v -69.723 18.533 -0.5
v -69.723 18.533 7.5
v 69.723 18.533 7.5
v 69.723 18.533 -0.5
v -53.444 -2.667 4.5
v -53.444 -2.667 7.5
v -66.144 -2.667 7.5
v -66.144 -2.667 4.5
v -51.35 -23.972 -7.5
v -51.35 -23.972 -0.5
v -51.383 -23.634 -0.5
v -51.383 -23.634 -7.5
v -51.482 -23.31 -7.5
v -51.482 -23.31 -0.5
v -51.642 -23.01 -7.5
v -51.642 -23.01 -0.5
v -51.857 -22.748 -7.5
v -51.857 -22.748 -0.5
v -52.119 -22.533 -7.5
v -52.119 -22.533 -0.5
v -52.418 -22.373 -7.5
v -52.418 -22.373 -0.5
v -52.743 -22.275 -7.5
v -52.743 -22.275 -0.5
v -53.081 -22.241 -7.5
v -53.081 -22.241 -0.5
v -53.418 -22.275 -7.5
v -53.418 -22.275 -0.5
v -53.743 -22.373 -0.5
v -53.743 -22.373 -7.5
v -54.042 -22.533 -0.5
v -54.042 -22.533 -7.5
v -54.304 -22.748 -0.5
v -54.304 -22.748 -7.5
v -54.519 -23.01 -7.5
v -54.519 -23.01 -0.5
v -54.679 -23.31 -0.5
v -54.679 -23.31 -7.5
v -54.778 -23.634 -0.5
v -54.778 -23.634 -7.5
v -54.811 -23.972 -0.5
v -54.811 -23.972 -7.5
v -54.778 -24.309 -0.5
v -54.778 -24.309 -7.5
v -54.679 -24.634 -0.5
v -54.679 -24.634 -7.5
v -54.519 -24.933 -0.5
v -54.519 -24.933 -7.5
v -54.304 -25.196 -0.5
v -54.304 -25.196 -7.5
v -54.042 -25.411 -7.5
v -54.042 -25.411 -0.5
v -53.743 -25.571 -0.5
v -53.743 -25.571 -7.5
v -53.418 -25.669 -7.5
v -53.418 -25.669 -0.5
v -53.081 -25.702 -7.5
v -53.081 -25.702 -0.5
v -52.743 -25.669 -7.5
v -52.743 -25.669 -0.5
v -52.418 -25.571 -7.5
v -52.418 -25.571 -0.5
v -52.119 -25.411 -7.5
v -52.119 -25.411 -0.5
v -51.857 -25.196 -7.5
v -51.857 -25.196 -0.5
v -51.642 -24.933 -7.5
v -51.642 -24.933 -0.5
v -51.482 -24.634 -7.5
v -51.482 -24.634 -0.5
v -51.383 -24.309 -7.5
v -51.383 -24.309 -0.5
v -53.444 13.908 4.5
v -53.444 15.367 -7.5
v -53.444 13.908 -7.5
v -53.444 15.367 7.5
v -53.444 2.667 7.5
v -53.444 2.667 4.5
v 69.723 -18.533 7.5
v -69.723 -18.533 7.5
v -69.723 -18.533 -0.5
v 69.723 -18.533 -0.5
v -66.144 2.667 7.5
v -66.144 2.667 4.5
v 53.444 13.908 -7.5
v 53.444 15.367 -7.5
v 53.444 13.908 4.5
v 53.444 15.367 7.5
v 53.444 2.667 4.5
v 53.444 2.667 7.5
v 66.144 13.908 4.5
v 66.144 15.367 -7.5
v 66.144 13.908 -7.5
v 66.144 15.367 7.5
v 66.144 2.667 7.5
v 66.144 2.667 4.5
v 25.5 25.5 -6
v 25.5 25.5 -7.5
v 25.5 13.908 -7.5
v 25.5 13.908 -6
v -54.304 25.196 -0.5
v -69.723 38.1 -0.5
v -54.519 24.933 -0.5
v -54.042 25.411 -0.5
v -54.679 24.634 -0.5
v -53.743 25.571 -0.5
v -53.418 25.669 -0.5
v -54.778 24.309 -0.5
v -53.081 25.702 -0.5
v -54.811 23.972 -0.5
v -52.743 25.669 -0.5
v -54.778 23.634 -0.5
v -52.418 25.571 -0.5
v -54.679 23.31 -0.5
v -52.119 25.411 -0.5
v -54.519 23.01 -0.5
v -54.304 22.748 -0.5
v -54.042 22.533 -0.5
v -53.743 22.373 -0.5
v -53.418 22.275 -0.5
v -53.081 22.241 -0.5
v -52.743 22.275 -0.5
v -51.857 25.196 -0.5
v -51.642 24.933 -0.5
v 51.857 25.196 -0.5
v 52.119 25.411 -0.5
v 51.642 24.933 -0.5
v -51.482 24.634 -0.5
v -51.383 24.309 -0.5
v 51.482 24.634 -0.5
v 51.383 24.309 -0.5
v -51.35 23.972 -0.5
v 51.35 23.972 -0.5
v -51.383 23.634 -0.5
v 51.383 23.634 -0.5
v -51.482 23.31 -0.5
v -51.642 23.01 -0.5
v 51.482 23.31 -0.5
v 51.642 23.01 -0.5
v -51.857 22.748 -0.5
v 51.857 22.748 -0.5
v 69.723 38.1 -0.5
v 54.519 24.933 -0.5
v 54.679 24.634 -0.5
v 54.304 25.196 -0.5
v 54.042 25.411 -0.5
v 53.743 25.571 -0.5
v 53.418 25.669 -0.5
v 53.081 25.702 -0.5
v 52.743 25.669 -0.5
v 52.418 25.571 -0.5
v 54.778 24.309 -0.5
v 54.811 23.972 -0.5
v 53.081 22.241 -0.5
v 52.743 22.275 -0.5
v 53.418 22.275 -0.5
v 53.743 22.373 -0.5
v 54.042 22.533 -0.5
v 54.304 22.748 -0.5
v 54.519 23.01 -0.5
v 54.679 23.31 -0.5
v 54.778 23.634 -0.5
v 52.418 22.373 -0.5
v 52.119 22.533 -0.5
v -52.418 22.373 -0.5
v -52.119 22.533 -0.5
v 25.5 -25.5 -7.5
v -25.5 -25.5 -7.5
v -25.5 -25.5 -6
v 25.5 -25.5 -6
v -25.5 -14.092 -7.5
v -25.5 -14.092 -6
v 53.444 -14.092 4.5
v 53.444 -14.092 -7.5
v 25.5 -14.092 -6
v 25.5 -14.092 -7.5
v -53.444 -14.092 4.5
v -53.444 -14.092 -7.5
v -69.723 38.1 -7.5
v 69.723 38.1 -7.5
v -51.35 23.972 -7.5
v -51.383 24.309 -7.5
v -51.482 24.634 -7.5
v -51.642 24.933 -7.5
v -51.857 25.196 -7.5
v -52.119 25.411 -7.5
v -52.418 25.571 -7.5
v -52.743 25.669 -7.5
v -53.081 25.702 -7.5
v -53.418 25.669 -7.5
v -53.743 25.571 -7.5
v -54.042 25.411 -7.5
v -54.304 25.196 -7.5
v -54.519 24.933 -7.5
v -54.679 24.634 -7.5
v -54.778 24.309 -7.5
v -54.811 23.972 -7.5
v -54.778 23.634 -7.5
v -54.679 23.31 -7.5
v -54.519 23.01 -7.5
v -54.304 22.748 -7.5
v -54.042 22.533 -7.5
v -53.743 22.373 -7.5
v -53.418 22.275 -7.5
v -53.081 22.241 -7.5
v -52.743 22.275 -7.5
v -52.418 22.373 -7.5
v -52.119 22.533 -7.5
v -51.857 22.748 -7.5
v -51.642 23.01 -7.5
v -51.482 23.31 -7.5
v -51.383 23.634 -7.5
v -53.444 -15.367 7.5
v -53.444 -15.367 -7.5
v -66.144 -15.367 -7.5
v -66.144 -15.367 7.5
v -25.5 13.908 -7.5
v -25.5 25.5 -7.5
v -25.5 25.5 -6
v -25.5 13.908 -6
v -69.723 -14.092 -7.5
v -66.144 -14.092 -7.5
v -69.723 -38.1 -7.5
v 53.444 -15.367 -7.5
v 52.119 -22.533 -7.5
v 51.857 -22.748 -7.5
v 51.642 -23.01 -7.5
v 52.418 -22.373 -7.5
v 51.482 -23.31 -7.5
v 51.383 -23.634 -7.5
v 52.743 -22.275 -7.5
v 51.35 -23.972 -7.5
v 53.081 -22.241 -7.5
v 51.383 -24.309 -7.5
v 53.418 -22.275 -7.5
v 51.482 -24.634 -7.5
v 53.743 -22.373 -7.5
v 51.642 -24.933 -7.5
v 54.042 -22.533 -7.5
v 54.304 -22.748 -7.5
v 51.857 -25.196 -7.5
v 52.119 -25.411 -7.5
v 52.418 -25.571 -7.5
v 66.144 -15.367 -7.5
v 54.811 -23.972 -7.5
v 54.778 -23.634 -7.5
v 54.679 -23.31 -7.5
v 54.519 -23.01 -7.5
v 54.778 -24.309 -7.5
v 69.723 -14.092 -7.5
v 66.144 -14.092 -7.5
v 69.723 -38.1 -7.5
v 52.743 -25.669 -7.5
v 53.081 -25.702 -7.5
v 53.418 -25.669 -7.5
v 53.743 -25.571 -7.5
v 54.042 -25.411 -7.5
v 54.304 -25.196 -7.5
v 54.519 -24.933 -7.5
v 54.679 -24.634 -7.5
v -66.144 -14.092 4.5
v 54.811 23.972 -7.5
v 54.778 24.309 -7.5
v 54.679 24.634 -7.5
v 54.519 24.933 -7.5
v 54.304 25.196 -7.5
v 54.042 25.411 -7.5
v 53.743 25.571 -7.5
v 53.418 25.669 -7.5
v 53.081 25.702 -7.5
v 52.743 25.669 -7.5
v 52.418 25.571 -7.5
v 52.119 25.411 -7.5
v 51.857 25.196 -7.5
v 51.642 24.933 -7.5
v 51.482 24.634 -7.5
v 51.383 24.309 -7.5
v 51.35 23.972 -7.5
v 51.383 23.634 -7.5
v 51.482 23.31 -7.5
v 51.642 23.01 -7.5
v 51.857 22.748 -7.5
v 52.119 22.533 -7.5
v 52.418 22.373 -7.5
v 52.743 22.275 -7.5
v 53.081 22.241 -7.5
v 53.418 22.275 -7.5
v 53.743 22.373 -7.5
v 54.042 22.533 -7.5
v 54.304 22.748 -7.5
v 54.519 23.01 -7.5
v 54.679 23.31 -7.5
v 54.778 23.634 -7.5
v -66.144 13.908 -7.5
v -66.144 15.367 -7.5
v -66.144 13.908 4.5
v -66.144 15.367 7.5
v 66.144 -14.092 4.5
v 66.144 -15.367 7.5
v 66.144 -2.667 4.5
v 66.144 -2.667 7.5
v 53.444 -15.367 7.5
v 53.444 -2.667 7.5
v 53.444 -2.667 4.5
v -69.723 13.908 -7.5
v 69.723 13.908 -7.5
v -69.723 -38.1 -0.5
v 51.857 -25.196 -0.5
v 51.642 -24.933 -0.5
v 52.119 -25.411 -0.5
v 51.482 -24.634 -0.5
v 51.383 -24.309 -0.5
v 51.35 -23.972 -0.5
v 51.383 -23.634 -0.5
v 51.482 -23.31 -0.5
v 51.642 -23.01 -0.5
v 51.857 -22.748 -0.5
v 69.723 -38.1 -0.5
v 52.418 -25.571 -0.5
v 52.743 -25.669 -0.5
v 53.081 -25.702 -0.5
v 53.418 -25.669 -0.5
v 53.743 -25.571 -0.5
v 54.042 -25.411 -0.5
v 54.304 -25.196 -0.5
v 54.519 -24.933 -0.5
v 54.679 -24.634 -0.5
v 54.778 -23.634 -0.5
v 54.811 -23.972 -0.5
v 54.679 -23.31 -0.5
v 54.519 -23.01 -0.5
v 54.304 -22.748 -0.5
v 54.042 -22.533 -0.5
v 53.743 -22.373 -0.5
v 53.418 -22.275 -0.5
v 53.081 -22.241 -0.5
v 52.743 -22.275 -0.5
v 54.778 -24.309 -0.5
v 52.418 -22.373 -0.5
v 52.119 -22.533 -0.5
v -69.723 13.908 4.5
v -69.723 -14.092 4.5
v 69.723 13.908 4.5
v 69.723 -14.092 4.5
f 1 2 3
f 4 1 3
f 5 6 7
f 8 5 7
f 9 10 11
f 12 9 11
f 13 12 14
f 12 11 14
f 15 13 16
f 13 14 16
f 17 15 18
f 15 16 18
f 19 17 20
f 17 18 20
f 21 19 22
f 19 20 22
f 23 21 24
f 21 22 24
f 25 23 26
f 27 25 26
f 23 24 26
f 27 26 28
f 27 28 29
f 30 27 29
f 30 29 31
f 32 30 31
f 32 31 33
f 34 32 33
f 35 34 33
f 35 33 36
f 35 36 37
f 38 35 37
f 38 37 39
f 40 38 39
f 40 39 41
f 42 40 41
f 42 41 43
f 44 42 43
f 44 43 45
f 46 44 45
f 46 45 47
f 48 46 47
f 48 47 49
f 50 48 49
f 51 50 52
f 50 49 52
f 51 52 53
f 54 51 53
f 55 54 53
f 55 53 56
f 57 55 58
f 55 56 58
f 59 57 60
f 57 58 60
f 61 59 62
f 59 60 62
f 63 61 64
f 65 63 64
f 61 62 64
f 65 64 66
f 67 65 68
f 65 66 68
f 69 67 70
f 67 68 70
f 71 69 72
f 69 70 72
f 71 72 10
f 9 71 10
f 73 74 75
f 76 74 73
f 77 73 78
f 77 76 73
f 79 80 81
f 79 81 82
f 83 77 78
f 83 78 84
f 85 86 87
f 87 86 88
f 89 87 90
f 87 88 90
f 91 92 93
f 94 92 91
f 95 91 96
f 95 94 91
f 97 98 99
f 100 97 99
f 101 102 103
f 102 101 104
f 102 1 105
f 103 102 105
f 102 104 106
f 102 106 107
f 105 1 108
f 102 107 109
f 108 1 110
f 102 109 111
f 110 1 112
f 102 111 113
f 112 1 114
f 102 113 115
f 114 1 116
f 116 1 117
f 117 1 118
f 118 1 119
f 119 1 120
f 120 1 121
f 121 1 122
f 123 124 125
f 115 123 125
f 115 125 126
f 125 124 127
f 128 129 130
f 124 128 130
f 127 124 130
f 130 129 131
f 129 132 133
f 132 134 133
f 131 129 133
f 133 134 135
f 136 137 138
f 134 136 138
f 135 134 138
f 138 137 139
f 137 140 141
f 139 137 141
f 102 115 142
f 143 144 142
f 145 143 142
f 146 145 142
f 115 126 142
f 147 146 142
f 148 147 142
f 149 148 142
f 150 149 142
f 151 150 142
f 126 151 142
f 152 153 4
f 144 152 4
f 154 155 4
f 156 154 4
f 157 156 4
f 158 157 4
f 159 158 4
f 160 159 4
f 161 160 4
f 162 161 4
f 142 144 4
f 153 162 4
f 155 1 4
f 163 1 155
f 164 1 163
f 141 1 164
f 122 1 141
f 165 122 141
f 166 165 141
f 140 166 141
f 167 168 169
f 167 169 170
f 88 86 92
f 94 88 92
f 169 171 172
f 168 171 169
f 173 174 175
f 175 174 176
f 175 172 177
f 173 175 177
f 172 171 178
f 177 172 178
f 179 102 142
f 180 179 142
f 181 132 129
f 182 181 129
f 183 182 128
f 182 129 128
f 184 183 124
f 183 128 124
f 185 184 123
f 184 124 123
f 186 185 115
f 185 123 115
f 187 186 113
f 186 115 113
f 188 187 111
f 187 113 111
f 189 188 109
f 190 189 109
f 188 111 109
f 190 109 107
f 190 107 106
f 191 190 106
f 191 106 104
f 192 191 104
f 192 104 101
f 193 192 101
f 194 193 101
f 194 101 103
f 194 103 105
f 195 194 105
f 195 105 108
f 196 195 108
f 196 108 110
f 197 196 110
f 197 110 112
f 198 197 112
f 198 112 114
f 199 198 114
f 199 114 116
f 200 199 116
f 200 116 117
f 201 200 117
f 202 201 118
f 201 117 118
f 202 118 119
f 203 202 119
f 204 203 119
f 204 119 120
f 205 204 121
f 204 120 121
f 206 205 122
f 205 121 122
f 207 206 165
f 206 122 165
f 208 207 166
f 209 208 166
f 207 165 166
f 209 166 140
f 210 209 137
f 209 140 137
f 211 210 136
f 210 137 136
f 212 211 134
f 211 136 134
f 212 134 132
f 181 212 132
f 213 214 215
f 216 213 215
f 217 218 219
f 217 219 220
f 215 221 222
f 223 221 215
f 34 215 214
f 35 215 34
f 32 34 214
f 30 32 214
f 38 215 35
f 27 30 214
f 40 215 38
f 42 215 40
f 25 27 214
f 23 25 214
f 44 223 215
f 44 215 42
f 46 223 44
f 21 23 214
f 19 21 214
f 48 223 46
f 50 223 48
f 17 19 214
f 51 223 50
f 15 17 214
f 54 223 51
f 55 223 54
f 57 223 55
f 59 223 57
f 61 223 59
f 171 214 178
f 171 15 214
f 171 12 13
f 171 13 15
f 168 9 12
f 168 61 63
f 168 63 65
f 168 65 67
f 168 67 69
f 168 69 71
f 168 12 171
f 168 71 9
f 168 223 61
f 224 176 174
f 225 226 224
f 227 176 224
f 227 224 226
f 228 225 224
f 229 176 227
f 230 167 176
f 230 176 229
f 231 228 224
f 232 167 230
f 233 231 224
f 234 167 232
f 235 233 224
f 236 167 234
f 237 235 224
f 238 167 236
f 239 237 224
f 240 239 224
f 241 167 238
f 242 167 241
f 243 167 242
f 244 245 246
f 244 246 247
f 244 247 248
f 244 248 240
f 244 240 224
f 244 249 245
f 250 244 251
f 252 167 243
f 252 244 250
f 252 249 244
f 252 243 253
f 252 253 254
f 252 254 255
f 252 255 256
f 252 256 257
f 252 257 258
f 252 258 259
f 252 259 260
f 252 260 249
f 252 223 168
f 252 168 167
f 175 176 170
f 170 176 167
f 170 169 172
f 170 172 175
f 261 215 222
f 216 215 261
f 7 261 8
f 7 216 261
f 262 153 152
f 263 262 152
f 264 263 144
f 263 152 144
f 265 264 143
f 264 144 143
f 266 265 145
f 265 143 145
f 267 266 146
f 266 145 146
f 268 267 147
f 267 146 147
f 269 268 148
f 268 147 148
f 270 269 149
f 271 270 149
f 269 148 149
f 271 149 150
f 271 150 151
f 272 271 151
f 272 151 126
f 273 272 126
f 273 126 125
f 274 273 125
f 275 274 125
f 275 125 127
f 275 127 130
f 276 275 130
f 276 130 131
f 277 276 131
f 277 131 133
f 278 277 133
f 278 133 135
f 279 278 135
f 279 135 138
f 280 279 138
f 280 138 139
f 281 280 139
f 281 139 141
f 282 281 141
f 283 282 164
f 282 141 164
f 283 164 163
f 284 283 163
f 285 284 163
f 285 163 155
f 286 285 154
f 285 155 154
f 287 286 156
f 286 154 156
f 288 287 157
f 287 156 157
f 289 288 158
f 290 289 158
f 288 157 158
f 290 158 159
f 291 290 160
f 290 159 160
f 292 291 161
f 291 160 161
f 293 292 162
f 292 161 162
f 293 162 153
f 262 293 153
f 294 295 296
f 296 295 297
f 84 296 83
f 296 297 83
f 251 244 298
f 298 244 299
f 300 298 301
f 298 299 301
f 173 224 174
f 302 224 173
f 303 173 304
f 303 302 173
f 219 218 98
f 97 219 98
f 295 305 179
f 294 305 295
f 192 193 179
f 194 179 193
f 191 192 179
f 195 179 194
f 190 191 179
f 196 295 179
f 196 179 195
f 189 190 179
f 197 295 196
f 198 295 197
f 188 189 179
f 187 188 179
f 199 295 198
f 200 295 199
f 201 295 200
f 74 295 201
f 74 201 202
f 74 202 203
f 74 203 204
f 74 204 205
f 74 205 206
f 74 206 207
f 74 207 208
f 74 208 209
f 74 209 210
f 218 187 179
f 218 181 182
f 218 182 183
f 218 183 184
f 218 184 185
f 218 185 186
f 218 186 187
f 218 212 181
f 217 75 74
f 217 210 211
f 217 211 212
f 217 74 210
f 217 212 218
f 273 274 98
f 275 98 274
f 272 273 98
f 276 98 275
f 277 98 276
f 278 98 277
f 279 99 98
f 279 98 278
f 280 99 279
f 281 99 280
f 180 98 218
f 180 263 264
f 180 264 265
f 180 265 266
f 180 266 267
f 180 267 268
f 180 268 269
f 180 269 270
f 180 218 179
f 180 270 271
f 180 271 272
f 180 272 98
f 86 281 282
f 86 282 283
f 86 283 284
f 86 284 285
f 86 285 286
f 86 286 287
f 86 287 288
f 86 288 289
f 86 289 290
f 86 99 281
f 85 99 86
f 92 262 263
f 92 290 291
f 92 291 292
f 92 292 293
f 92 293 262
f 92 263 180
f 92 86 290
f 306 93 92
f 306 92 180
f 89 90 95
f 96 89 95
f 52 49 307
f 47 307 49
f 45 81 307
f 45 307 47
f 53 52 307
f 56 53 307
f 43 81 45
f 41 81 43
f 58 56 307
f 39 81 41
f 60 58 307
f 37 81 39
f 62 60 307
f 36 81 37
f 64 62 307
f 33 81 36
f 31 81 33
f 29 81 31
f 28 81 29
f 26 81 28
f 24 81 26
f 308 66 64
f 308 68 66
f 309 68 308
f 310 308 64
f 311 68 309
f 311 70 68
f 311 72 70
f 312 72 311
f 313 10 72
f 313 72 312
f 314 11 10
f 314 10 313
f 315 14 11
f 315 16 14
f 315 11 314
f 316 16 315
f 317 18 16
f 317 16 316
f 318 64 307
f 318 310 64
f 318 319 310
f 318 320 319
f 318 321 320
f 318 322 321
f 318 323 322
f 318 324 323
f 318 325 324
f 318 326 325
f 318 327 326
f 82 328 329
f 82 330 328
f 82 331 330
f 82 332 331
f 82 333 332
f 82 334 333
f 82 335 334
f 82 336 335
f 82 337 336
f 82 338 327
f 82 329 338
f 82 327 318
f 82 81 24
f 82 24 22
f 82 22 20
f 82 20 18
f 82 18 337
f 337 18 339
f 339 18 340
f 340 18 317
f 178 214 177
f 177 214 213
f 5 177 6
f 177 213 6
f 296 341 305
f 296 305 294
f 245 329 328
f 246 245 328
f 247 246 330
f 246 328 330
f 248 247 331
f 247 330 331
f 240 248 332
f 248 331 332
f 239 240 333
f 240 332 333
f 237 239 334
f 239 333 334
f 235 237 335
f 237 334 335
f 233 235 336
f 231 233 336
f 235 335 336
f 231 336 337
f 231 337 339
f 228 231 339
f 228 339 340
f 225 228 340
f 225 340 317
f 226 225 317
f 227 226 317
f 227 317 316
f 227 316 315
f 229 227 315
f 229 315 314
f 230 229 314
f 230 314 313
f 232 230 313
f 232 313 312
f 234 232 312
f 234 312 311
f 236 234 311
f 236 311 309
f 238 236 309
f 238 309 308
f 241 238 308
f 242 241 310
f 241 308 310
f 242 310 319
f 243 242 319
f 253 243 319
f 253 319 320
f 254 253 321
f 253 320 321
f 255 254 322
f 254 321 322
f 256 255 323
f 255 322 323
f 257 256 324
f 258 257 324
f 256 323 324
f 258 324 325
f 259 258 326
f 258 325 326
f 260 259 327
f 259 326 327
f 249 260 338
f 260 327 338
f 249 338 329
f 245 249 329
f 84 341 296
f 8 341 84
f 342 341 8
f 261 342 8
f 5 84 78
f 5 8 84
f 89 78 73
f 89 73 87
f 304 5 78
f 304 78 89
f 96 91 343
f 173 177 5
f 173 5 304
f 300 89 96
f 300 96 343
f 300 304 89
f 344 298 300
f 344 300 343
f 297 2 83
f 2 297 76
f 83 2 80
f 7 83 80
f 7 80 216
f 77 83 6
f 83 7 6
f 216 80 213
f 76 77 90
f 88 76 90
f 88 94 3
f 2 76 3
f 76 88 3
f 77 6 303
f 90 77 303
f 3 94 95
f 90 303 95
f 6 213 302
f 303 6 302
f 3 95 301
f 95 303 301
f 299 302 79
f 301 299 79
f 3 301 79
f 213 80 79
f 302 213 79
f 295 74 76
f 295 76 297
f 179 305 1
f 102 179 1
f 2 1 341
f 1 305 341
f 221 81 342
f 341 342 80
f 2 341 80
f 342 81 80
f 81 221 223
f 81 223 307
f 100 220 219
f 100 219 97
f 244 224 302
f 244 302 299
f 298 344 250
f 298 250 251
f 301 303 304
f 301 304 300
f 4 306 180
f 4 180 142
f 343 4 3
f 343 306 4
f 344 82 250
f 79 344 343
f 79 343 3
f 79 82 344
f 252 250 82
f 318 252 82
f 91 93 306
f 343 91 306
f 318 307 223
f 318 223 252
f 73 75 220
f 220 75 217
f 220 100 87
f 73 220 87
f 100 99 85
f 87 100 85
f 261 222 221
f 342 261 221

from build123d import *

# Parameters (mm, degrees)
F0_W      = 139.446
F0_H      = 14.999996
F1_DEPTH  = 38.1
F2_W      = 139.446
F2_H      = 19.567398
F3_DEPTH  = 8.000009
F5_W      = 12.7
F5_H      = 12.7
F6_DEPTH  = 21.844
F9_R      = 1.730591
F10_DEPTH = 42.164
F12_W     = 50.999898
F12_H     = 50.999898
F13_DEPTH = 1.5
F14_DEPTH = 12.000001


with BuildPart() as f1:
    # F0 (on Front) → F1 (new body, symmetric)
    with BuildSketch(Plane.XZ):
        Rectangle(F0_W, F0_H)
    extrude(amount=F1_DEPTH, both=True)

    # F2 (on face) → F3 (cut)
    with BuildSketch(Plane.XY.offset(7.499998)):
        with Locations((0, -28.316301)):
            Rectangle(F2_W, F2_H)
    extrude(amount=-F3_DEPTH, mode=Mode.SUBTRACT)

    # F4: F1 across plane


with BuildPart() as f1_1:
    add(f1.part)
    add(f1.part.mirror(Plane.XZ), mode=Mode.INTERSECT)

    # F5 (on face) → F6 (cut)
    with BuildSketch(Plane.XY.offset(7.499998)):
        with Locations((59.793662, -9.017324)):
            Rectangle(F5_W, F5_H)
    extrude(amount=-F6_DEPTH, mode=Mode.SUBTRACT)

    # F7: F1 across plane


with BuildPart() as f1_2:
    add(f1_1.part)
    add(f1_1.part.mirror(Plane.XZ), mode=Mode.INTERSECT)

    # F8: F1 across plane


with BuildPart() as f1_3:
    add(f1_2.part)
    add(f1_2.part.mirror(Plane.YZ), mode=Mode.INTERSECT)

    # F9 (on Top) → F10 (cut)
    with BuildSketch(Plane.XY):
        with Locations((53.080564, -23.971872)):
            Circle(F9_R)
        with Locations((53.080564, 23.971872)):
            Circle(F9_R)
        with Locations((-53.080564, 23.971872)):
            Circle(F9_R)
        with Locations((-53.080564, -23.971872)):
            Circle(F9_R)
    extrude(amount=-F10_DEPTH, mode=Mode.SUBTRACT)

    # F12 (on face) → F13 (cut)
    with BuildSketch(Plane(origin=(0, 0, -7.499998), x_dir=(1, 0, 0), z_dir=(0, 0, -1))):
        Rectangle(F12_W, F12_H)
    extrude(amount=-F13_DEPTH, mode=Mode.SUBTRACT)

    # F11 (on face) → F14 (cut)
    with BuildSketch(Plane(origin=(0, 0, -7.499998), x_dir=(1, 0, 0), z_dir=(0, 0, -1))):
        Polygon((69.723, -13.90828), (69.723, 14.091664), (1.722882, 14.091664), (-69.723, 14.091664), (-69.723, -13.90828), (1.722882, -13.90828), align=None)
    extrude(amount=-F14_DEPTH, mode=Mode.SUBTRACT)


solid = f1_3.part
